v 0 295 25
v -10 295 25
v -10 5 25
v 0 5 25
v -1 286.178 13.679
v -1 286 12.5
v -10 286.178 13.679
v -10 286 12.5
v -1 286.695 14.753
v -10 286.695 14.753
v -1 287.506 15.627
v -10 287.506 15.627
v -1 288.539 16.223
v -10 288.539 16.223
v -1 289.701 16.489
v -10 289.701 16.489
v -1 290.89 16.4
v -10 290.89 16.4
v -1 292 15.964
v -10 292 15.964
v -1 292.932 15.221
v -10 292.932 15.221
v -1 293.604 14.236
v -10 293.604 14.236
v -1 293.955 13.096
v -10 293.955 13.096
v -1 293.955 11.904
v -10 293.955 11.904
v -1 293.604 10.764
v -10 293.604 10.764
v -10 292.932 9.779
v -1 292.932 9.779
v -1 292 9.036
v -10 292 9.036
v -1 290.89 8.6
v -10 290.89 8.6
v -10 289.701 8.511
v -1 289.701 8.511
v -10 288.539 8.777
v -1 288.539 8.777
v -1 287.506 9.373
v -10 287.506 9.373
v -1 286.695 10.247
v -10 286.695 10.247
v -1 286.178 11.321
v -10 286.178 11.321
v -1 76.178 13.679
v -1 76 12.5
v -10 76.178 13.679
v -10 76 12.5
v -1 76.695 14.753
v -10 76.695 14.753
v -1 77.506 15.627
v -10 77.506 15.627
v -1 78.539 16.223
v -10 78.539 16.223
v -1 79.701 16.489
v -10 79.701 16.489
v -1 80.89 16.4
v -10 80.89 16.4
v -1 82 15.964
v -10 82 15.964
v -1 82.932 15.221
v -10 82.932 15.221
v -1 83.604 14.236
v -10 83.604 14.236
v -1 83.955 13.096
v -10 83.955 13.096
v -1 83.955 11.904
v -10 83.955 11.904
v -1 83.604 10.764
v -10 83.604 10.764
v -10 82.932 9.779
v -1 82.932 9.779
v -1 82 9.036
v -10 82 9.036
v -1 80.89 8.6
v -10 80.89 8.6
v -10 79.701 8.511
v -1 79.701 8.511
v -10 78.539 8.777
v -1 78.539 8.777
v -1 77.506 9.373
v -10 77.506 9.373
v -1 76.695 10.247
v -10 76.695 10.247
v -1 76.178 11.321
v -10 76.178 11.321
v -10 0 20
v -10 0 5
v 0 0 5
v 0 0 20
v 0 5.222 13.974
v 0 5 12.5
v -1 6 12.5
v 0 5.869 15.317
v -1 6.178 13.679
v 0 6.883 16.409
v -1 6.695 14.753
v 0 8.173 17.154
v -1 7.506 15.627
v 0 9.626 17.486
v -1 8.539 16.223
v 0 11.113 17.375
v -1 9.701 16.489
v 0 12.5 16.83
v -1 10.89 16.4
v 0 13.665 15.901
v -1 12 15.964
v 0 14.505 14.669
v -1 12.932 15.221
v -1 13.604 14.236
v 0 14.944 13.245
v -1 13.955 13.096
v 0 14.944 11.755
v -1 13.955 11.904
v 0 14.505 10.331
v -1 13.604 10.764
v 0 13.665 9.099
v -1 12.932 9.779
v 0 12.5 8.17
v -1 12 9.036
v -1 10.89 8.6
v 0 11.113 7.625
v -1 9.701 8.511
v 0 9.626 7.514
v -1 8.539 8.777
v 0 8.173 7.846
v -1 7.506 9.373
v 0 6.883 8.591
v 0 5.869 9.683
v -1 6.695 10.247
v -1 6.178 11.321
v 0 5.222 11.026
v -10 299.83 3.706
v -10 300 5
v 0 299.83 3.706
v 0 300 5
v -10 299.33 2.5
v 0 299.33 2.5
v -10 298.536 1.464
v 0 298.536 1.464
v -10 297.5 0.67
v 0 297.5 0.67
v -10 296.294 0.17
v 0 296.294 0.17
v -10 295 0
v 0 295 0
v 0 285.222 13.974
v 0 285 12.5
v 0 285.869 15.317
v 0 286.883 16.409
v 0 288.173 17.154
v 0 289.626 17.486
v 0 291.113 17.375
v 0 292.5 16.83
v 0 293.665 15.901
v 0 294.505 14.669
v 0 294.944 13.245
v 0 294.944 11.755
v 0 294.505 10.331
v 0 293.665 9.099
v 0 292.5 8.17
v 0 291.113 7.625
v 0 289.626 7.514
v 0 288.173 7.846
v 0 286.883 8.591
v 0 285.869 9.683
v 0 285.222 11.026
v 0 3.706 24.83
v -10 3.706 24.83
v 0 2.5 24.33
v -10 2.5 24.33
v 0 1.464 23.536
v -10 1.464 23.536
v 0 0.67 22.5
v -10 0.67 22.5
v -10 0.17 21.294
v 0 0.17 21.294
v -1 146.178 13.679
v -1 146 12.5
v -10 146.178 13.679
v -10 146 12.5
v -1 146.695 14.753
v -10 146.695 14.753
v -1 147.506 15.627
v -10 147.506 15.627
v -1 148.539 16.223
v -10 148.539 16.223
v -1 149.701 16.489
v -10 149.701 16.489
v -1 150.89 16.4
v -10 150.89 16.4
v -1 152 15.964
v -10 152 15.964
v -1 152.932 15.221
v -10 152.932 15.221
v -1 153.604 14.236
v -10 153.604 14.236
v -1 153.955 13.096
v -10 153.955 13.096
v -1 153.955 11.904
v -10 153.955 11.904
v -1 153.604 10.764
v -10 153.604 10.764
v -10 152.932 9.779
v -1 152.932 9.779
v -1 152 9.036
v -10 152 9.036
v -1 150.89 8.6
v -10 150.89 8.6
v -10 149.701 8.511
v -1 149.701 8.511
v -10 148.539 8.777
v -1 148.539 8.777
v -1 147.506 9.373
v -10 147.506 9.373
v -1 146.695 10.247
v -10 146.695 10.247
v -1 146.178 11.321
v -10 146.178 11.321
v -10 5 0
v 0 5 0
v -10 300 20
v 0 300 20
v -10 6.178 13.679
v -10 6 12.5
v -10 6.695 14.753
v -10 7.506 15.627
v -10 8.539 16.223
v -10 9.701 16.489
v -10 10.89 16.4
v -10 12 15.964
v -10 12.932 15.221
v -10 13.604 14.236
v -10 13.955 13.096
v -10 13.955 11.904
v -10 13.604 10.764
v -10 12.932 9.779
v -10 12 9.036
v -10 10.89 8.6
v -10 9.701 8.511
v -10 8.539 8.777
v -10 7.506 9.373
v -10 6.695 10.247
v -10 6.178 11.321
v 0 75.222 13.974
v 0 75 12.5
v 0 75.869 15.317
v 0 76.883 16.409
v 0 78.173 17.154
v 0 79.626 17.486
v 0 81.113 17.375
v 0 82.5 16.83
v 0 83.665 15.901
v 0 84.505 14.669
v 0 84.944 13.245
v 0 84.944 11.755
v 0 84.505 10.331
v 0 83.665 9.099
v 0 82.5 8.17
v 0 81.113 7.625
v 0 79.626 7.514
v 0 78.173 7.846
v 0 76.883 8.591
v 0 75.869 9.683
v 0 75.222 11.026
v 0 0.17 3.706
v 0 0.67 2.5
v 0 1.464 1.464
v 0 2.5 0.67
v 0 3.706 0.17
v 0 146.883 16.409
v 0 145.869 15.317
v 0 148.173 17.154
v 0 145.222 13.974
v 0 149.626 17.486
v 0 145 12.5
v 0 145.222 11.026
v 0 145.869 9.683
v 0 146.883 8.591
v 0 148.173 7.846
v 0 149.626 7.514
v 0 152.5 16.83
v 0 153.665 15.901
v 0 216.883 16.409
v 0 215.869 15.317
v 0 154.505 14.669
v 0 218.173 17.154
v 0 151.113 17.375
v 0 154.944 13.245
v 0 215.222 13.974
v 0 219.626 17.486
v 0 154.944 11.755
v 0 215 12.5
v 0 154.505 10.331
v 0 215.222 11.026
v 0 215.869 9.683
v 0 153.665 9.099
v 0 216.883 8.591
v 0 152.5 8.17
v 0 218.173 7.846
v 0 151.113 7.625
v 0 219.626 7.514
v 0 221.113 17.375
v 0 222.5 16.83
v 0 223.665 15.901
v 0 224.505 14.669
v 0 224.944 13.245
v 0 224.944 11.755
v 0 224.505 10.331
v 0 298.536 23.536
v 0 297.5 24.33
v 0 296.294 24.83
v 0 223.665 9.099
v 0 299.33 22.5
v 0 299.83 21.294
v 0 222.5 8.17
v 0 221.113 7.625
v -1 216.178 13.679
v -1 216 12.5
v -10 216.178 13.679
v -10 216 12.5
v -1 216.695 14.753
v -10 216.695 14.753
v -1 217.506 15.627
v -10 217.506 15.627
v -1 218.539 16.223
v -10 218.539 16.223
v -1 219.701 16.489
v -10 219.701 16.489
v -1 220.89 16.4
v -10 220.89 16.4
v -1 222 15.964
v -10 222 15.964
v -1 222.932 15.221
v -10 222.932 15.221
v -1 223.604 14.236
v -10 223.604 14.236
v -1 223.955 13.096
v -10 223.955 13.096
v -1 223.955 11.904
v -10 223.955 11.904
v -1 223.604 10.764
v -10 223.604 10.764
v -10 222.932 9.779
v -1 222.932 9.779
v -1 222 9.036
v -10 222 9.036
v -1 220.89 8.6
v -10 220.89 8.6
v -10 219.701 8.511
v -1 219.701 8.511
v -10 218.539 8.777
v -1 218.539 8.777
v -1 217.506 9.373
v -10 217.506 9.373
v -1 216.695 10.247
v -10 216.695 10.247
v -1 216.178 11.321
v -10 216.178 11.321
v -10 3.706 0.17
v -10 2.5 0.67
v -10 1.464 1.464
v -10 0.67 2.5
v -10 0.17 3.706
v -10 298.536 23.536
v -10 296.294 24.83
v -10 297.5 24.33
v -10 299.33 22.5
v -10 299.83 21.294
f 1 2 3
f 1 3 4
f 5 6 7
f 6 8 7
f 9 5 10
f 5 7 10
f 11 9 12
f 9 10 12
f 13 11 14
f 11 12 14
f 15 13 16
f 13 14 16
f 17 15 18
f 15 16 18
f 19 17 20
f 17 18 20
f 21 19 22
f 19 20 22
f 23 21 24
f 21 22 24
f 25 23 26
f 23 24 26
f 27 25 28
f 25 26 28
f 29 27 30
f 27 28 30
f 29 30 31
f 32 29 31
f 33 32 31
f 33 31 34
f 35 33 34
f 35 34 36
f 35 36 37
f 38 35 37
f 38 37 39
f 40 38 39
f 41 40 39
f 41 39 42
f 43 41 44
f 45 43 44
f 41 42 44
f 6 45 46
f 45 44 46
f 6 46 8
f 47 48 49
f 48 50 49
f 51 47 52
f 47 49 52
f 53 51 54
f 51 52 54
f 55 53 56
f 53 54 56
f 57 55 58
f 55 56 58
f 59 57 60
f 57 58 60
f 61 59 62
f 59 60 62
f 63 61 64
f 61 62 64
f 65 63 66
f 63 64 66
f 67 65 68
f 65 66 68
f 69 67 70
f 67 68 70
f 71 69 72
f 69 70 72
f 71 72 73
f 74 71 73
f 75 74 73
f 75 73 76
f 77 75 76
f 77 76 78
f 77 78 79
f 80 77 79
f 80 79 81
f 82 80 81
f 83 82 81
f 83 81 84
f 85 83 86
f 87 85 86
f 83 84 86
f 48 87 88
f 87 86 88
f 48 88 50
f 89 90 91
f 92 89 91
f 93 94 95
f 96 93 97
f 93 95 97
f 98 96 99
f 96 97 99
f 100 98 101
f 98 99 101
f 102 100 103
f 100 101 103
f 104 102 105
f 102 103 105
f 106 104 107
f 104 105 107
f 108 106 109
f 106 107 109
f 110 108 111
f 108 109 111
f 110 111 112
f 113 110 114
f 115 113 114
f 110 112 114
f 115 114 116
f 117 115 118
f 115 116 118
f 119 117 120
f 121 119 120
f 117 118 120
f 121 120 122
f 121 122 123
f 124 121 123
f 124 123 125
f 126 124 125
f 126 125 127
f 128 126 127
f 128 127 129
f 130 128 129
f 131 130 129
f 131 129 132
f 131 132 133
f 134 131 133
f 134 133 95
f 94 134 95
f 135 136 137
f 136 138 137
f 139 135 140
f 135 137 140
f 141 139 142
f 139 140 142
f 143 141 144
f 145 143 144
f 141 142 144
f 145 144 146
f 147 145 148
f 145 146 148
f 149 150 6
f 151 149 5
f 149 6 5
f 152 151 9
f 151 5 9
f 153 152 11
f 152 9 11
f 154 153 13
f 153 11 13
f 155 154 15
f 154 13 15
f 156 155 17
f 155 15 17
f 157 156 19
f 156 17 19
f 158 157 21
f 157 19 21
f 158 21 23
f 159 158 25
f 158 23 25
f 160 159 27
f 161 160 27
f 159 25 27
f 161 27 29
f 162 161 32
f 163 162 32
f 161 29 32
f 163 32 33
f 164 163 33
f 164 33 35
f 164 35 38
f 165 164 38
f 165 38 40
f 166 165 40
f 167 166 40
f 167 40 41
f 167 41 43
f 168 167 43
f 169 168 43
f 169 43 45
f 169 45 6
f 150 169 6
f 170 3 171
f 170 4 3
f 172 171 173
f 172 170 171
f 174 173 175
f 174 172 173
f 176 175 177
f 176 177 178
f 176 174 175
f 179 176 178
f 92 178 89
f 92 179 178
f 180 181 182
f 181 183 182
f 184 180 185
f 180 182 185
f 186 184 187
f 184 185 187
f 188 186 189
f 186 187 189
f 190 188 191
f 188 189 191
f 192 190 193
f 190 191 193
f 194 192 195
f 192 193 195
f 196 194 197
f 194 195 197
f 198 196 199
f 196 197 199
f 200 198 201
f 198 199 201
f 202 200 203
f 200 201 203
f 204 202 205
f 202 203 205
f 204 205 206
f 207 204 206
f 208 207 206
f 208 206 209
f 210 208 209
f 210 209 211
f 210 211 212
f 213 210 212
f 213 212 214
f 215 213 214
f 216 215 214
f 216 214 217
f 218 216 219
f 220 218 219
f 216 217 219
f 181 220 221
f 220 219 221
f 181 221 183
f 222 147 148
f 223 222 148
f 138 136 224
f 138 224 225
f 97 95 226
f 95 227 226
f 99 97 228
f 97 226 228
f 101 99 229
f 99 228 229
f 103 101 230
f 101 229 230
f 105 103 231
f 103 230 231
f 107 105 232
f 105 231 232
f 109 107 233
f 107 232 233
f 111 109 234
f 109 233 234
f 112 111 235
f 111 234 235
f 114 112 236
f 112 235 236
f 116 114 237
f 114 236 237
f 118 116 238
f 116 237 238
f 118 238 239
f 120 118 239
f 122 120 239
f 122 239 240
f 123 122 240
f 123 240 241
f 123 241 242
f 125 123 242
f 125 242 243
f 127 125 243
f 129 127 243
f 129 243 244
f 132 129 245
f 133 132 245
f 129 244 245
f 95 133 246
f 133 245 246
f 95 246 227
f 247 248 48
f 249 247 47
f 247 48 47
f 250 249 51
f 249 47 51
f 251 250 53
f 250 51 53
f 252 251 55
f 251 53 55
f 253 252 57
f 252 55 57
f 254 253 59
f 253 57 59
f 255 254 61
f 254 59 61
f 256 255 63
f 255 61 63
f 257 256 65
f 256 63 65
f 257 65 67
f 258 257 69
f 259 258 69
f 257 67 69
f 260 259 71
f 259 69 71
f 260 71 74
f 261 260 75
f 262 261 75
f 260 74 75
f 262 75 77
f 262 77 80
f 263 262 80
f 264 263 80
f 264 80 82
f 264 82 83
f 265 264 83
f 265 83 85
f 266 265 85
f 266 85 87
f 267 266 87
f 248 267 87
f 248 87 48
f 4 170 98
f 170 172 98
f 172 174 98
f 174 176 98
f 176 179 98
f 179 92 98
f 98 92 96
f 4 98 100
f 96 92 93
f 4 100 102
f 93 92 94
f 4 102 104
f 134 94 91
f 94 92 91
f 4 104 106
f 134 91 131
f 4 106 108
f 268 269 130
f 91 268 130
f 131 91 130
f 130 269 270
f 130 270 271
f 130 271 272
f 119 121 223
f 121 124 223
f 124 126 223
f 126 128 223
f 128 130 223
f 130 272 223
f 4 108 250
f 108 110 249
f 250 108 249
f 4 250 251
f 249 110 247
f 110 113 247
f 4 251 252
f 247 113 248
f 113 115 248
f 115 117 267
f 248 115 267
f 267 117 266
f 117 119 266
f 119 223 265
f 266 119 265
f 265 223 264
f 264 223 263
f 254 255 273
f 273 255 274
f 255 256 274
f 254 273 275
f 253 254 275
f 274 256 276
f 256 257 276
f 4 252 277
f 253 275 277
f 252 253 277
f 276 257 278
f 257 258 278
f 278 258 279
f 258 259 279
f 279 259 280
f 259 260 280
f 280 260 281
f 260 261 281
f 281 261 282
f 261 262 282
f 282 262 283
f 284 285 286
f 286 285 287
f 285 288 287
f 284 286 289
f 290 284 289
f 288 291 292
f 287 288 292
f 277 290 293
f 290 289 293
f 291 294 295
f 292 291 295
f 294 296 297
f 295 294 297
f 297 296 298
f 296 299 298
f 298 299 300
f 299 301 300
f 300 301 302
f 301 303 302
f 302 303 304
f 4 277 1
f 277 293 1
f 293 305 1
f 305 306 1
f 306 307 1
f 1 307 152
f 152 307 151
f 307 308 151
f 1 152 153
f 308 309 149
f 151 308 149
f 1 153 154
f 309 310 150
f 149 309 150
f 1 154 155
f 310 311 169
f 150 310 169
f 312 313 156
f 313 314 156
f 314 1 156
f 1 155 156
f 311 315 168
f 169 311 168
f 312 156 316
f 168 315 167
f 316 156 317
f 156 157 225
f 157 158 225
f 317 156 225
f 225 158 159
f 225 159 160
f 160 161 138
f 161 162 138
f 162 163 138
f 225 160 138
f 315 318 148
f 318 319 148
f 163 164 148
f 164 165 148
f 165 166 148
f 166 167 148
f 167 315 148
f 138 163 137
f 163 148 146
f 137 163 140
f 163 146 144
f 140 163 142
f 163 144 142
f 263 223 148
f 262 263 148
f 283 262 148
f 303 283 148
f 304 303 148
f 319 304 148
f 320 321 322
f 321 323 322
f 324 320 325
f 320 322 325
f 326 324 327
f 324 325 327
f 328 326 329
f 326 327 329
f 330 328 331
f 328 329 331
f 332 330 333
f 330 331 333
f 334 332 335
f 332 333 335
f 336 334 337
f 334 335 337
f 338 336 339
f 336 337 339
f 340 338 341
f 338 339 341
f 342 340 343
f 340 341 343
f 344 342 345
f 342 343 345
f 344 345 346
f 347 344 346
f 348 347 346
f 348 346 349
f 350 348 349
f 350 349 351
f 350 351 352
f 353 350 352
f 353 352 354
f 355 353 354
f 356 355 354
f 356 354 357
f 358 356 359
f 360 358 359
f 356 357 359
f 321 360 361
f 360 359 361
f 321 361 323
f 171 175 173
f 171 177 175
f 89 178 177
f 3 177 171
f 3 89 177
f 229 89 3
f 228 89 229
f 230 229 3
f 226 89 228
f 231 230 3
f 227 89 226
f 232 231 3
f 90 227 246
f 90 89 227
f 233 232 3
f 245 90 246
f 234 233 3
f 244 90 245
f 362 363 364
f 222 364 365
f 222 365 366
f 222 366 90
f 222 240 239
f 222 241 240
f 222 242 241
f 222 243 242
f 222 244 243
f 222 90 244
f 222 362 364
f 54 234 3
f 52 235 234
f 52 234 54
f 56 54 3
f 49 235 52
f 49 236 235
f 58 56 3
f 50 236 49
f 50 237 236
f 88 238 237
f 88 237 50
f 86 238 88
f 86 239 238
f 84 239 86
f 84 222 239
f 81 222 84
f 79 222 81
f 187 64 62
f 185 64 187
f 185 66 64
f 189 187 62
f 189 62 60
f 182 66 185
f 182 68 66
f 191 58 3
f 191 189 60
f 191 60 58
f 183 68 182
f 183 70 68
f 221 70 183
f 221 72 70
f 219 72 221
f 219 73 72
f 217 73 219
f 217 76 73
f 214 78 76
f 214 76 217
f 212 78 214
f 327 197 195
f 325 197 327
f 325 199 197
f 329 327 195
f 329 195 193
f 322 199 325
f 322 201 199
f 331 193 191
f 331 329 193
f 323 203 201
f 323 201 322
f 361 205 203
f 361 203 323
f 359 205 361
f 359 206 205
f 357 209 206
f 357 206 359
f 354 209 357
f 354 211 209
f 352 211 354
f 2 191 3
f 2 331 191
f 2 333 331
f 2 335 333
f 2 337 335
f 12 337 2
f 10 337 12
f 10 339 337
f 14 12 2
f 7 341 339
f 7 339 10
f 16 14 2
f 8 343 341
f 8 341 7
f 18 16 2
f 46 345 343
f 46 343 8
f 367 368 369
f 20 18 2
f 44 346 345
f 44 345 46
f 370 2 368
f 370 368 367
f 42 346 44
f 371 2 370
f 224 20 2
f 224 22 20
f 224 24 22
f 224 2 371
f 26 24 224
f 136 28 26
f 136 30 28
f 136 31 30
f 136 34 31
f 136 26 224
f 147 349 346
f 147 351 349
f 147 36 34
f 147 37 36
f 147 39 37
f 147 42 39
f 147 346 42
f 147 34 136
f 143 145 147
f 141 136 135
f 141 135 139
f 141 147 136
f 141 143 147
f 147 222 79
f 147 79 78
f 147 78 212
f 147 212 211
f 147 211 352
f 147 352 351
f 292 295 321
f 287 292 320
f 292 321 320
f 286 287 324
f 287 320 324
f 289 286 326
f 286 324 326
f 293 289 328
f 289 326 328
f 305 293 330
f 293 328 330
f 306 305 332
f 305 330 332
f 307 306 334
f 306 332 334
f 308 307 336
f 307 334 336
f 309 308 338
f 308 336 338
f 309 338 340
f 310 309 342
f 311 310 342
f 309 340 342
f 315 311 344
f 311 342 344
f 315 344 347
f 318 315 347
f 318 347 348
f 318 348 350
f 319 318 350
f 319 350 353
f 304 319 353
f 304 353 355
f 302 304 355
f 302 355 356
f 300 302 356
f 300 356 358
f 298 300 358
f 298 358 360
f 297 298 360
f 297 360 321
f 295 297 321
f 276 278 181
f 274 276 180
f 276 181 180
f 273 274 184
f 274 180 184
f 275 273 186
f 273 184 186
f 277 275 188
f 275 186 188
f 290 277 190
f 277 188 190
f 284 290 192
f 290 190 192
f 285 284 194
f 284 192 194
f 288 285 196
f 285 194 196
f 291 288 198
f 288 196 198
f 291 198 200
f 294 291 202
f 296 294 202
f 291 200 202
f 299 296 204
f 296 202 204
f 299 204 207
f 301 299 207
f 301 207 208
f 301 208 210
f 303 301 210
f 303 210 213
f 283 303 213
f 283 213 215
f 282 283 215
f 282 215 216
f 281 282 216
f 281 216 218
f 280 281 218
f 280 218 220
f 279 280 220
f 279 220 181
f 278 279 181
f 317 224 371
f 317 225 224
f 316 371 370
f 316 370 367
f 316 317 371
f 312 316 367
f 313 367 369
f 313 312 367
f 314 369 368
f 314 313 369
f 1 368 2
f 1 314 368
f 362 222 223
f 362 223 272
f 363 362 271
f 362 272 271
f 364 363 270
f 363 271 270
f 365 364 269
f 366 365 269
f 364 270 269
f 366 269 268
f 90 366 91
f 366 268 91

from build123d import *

# Parameters (mm, degrees)
F0_W           = 10
F0_H           = 300
F1_DEPTH       = 25
F3_D           = 8
F3_CSINK_D     = 10
F3_CSINK_ANGLE = 90
F4_R           = 5


with BuildPart() as f1:
    # F0 (on Top) → F1 (new body)
    with BuildSketch(Plane.XY):
        with Locations((-5, 150)):
            Rectangle(F0_W, F0_H)
    extrude(amount=F1_DEPTH)

    # F3 (through all)
    with Locations(Plane.YZ):
        with Locations((10, 12.5), (80, 12.5), (150, 12.5), (220, 12.5), (290, 12.5)):
            CounterSinkHole(F3_D / 2, F3_CSINK_D / 2, counter_sink_angle=F3_CSINK_ANGLE)

    # F4
    f4_edges = [f1.edges().sort_by_distance(p)[0] for p in [
        (-5, 0, 0),
        (-5, 300, 0),
        (-5, 0, 25),
        (-5, 300, 25),
    ]]
    fillet(f4_edges, radius=F4_R)


solid = f1.part
